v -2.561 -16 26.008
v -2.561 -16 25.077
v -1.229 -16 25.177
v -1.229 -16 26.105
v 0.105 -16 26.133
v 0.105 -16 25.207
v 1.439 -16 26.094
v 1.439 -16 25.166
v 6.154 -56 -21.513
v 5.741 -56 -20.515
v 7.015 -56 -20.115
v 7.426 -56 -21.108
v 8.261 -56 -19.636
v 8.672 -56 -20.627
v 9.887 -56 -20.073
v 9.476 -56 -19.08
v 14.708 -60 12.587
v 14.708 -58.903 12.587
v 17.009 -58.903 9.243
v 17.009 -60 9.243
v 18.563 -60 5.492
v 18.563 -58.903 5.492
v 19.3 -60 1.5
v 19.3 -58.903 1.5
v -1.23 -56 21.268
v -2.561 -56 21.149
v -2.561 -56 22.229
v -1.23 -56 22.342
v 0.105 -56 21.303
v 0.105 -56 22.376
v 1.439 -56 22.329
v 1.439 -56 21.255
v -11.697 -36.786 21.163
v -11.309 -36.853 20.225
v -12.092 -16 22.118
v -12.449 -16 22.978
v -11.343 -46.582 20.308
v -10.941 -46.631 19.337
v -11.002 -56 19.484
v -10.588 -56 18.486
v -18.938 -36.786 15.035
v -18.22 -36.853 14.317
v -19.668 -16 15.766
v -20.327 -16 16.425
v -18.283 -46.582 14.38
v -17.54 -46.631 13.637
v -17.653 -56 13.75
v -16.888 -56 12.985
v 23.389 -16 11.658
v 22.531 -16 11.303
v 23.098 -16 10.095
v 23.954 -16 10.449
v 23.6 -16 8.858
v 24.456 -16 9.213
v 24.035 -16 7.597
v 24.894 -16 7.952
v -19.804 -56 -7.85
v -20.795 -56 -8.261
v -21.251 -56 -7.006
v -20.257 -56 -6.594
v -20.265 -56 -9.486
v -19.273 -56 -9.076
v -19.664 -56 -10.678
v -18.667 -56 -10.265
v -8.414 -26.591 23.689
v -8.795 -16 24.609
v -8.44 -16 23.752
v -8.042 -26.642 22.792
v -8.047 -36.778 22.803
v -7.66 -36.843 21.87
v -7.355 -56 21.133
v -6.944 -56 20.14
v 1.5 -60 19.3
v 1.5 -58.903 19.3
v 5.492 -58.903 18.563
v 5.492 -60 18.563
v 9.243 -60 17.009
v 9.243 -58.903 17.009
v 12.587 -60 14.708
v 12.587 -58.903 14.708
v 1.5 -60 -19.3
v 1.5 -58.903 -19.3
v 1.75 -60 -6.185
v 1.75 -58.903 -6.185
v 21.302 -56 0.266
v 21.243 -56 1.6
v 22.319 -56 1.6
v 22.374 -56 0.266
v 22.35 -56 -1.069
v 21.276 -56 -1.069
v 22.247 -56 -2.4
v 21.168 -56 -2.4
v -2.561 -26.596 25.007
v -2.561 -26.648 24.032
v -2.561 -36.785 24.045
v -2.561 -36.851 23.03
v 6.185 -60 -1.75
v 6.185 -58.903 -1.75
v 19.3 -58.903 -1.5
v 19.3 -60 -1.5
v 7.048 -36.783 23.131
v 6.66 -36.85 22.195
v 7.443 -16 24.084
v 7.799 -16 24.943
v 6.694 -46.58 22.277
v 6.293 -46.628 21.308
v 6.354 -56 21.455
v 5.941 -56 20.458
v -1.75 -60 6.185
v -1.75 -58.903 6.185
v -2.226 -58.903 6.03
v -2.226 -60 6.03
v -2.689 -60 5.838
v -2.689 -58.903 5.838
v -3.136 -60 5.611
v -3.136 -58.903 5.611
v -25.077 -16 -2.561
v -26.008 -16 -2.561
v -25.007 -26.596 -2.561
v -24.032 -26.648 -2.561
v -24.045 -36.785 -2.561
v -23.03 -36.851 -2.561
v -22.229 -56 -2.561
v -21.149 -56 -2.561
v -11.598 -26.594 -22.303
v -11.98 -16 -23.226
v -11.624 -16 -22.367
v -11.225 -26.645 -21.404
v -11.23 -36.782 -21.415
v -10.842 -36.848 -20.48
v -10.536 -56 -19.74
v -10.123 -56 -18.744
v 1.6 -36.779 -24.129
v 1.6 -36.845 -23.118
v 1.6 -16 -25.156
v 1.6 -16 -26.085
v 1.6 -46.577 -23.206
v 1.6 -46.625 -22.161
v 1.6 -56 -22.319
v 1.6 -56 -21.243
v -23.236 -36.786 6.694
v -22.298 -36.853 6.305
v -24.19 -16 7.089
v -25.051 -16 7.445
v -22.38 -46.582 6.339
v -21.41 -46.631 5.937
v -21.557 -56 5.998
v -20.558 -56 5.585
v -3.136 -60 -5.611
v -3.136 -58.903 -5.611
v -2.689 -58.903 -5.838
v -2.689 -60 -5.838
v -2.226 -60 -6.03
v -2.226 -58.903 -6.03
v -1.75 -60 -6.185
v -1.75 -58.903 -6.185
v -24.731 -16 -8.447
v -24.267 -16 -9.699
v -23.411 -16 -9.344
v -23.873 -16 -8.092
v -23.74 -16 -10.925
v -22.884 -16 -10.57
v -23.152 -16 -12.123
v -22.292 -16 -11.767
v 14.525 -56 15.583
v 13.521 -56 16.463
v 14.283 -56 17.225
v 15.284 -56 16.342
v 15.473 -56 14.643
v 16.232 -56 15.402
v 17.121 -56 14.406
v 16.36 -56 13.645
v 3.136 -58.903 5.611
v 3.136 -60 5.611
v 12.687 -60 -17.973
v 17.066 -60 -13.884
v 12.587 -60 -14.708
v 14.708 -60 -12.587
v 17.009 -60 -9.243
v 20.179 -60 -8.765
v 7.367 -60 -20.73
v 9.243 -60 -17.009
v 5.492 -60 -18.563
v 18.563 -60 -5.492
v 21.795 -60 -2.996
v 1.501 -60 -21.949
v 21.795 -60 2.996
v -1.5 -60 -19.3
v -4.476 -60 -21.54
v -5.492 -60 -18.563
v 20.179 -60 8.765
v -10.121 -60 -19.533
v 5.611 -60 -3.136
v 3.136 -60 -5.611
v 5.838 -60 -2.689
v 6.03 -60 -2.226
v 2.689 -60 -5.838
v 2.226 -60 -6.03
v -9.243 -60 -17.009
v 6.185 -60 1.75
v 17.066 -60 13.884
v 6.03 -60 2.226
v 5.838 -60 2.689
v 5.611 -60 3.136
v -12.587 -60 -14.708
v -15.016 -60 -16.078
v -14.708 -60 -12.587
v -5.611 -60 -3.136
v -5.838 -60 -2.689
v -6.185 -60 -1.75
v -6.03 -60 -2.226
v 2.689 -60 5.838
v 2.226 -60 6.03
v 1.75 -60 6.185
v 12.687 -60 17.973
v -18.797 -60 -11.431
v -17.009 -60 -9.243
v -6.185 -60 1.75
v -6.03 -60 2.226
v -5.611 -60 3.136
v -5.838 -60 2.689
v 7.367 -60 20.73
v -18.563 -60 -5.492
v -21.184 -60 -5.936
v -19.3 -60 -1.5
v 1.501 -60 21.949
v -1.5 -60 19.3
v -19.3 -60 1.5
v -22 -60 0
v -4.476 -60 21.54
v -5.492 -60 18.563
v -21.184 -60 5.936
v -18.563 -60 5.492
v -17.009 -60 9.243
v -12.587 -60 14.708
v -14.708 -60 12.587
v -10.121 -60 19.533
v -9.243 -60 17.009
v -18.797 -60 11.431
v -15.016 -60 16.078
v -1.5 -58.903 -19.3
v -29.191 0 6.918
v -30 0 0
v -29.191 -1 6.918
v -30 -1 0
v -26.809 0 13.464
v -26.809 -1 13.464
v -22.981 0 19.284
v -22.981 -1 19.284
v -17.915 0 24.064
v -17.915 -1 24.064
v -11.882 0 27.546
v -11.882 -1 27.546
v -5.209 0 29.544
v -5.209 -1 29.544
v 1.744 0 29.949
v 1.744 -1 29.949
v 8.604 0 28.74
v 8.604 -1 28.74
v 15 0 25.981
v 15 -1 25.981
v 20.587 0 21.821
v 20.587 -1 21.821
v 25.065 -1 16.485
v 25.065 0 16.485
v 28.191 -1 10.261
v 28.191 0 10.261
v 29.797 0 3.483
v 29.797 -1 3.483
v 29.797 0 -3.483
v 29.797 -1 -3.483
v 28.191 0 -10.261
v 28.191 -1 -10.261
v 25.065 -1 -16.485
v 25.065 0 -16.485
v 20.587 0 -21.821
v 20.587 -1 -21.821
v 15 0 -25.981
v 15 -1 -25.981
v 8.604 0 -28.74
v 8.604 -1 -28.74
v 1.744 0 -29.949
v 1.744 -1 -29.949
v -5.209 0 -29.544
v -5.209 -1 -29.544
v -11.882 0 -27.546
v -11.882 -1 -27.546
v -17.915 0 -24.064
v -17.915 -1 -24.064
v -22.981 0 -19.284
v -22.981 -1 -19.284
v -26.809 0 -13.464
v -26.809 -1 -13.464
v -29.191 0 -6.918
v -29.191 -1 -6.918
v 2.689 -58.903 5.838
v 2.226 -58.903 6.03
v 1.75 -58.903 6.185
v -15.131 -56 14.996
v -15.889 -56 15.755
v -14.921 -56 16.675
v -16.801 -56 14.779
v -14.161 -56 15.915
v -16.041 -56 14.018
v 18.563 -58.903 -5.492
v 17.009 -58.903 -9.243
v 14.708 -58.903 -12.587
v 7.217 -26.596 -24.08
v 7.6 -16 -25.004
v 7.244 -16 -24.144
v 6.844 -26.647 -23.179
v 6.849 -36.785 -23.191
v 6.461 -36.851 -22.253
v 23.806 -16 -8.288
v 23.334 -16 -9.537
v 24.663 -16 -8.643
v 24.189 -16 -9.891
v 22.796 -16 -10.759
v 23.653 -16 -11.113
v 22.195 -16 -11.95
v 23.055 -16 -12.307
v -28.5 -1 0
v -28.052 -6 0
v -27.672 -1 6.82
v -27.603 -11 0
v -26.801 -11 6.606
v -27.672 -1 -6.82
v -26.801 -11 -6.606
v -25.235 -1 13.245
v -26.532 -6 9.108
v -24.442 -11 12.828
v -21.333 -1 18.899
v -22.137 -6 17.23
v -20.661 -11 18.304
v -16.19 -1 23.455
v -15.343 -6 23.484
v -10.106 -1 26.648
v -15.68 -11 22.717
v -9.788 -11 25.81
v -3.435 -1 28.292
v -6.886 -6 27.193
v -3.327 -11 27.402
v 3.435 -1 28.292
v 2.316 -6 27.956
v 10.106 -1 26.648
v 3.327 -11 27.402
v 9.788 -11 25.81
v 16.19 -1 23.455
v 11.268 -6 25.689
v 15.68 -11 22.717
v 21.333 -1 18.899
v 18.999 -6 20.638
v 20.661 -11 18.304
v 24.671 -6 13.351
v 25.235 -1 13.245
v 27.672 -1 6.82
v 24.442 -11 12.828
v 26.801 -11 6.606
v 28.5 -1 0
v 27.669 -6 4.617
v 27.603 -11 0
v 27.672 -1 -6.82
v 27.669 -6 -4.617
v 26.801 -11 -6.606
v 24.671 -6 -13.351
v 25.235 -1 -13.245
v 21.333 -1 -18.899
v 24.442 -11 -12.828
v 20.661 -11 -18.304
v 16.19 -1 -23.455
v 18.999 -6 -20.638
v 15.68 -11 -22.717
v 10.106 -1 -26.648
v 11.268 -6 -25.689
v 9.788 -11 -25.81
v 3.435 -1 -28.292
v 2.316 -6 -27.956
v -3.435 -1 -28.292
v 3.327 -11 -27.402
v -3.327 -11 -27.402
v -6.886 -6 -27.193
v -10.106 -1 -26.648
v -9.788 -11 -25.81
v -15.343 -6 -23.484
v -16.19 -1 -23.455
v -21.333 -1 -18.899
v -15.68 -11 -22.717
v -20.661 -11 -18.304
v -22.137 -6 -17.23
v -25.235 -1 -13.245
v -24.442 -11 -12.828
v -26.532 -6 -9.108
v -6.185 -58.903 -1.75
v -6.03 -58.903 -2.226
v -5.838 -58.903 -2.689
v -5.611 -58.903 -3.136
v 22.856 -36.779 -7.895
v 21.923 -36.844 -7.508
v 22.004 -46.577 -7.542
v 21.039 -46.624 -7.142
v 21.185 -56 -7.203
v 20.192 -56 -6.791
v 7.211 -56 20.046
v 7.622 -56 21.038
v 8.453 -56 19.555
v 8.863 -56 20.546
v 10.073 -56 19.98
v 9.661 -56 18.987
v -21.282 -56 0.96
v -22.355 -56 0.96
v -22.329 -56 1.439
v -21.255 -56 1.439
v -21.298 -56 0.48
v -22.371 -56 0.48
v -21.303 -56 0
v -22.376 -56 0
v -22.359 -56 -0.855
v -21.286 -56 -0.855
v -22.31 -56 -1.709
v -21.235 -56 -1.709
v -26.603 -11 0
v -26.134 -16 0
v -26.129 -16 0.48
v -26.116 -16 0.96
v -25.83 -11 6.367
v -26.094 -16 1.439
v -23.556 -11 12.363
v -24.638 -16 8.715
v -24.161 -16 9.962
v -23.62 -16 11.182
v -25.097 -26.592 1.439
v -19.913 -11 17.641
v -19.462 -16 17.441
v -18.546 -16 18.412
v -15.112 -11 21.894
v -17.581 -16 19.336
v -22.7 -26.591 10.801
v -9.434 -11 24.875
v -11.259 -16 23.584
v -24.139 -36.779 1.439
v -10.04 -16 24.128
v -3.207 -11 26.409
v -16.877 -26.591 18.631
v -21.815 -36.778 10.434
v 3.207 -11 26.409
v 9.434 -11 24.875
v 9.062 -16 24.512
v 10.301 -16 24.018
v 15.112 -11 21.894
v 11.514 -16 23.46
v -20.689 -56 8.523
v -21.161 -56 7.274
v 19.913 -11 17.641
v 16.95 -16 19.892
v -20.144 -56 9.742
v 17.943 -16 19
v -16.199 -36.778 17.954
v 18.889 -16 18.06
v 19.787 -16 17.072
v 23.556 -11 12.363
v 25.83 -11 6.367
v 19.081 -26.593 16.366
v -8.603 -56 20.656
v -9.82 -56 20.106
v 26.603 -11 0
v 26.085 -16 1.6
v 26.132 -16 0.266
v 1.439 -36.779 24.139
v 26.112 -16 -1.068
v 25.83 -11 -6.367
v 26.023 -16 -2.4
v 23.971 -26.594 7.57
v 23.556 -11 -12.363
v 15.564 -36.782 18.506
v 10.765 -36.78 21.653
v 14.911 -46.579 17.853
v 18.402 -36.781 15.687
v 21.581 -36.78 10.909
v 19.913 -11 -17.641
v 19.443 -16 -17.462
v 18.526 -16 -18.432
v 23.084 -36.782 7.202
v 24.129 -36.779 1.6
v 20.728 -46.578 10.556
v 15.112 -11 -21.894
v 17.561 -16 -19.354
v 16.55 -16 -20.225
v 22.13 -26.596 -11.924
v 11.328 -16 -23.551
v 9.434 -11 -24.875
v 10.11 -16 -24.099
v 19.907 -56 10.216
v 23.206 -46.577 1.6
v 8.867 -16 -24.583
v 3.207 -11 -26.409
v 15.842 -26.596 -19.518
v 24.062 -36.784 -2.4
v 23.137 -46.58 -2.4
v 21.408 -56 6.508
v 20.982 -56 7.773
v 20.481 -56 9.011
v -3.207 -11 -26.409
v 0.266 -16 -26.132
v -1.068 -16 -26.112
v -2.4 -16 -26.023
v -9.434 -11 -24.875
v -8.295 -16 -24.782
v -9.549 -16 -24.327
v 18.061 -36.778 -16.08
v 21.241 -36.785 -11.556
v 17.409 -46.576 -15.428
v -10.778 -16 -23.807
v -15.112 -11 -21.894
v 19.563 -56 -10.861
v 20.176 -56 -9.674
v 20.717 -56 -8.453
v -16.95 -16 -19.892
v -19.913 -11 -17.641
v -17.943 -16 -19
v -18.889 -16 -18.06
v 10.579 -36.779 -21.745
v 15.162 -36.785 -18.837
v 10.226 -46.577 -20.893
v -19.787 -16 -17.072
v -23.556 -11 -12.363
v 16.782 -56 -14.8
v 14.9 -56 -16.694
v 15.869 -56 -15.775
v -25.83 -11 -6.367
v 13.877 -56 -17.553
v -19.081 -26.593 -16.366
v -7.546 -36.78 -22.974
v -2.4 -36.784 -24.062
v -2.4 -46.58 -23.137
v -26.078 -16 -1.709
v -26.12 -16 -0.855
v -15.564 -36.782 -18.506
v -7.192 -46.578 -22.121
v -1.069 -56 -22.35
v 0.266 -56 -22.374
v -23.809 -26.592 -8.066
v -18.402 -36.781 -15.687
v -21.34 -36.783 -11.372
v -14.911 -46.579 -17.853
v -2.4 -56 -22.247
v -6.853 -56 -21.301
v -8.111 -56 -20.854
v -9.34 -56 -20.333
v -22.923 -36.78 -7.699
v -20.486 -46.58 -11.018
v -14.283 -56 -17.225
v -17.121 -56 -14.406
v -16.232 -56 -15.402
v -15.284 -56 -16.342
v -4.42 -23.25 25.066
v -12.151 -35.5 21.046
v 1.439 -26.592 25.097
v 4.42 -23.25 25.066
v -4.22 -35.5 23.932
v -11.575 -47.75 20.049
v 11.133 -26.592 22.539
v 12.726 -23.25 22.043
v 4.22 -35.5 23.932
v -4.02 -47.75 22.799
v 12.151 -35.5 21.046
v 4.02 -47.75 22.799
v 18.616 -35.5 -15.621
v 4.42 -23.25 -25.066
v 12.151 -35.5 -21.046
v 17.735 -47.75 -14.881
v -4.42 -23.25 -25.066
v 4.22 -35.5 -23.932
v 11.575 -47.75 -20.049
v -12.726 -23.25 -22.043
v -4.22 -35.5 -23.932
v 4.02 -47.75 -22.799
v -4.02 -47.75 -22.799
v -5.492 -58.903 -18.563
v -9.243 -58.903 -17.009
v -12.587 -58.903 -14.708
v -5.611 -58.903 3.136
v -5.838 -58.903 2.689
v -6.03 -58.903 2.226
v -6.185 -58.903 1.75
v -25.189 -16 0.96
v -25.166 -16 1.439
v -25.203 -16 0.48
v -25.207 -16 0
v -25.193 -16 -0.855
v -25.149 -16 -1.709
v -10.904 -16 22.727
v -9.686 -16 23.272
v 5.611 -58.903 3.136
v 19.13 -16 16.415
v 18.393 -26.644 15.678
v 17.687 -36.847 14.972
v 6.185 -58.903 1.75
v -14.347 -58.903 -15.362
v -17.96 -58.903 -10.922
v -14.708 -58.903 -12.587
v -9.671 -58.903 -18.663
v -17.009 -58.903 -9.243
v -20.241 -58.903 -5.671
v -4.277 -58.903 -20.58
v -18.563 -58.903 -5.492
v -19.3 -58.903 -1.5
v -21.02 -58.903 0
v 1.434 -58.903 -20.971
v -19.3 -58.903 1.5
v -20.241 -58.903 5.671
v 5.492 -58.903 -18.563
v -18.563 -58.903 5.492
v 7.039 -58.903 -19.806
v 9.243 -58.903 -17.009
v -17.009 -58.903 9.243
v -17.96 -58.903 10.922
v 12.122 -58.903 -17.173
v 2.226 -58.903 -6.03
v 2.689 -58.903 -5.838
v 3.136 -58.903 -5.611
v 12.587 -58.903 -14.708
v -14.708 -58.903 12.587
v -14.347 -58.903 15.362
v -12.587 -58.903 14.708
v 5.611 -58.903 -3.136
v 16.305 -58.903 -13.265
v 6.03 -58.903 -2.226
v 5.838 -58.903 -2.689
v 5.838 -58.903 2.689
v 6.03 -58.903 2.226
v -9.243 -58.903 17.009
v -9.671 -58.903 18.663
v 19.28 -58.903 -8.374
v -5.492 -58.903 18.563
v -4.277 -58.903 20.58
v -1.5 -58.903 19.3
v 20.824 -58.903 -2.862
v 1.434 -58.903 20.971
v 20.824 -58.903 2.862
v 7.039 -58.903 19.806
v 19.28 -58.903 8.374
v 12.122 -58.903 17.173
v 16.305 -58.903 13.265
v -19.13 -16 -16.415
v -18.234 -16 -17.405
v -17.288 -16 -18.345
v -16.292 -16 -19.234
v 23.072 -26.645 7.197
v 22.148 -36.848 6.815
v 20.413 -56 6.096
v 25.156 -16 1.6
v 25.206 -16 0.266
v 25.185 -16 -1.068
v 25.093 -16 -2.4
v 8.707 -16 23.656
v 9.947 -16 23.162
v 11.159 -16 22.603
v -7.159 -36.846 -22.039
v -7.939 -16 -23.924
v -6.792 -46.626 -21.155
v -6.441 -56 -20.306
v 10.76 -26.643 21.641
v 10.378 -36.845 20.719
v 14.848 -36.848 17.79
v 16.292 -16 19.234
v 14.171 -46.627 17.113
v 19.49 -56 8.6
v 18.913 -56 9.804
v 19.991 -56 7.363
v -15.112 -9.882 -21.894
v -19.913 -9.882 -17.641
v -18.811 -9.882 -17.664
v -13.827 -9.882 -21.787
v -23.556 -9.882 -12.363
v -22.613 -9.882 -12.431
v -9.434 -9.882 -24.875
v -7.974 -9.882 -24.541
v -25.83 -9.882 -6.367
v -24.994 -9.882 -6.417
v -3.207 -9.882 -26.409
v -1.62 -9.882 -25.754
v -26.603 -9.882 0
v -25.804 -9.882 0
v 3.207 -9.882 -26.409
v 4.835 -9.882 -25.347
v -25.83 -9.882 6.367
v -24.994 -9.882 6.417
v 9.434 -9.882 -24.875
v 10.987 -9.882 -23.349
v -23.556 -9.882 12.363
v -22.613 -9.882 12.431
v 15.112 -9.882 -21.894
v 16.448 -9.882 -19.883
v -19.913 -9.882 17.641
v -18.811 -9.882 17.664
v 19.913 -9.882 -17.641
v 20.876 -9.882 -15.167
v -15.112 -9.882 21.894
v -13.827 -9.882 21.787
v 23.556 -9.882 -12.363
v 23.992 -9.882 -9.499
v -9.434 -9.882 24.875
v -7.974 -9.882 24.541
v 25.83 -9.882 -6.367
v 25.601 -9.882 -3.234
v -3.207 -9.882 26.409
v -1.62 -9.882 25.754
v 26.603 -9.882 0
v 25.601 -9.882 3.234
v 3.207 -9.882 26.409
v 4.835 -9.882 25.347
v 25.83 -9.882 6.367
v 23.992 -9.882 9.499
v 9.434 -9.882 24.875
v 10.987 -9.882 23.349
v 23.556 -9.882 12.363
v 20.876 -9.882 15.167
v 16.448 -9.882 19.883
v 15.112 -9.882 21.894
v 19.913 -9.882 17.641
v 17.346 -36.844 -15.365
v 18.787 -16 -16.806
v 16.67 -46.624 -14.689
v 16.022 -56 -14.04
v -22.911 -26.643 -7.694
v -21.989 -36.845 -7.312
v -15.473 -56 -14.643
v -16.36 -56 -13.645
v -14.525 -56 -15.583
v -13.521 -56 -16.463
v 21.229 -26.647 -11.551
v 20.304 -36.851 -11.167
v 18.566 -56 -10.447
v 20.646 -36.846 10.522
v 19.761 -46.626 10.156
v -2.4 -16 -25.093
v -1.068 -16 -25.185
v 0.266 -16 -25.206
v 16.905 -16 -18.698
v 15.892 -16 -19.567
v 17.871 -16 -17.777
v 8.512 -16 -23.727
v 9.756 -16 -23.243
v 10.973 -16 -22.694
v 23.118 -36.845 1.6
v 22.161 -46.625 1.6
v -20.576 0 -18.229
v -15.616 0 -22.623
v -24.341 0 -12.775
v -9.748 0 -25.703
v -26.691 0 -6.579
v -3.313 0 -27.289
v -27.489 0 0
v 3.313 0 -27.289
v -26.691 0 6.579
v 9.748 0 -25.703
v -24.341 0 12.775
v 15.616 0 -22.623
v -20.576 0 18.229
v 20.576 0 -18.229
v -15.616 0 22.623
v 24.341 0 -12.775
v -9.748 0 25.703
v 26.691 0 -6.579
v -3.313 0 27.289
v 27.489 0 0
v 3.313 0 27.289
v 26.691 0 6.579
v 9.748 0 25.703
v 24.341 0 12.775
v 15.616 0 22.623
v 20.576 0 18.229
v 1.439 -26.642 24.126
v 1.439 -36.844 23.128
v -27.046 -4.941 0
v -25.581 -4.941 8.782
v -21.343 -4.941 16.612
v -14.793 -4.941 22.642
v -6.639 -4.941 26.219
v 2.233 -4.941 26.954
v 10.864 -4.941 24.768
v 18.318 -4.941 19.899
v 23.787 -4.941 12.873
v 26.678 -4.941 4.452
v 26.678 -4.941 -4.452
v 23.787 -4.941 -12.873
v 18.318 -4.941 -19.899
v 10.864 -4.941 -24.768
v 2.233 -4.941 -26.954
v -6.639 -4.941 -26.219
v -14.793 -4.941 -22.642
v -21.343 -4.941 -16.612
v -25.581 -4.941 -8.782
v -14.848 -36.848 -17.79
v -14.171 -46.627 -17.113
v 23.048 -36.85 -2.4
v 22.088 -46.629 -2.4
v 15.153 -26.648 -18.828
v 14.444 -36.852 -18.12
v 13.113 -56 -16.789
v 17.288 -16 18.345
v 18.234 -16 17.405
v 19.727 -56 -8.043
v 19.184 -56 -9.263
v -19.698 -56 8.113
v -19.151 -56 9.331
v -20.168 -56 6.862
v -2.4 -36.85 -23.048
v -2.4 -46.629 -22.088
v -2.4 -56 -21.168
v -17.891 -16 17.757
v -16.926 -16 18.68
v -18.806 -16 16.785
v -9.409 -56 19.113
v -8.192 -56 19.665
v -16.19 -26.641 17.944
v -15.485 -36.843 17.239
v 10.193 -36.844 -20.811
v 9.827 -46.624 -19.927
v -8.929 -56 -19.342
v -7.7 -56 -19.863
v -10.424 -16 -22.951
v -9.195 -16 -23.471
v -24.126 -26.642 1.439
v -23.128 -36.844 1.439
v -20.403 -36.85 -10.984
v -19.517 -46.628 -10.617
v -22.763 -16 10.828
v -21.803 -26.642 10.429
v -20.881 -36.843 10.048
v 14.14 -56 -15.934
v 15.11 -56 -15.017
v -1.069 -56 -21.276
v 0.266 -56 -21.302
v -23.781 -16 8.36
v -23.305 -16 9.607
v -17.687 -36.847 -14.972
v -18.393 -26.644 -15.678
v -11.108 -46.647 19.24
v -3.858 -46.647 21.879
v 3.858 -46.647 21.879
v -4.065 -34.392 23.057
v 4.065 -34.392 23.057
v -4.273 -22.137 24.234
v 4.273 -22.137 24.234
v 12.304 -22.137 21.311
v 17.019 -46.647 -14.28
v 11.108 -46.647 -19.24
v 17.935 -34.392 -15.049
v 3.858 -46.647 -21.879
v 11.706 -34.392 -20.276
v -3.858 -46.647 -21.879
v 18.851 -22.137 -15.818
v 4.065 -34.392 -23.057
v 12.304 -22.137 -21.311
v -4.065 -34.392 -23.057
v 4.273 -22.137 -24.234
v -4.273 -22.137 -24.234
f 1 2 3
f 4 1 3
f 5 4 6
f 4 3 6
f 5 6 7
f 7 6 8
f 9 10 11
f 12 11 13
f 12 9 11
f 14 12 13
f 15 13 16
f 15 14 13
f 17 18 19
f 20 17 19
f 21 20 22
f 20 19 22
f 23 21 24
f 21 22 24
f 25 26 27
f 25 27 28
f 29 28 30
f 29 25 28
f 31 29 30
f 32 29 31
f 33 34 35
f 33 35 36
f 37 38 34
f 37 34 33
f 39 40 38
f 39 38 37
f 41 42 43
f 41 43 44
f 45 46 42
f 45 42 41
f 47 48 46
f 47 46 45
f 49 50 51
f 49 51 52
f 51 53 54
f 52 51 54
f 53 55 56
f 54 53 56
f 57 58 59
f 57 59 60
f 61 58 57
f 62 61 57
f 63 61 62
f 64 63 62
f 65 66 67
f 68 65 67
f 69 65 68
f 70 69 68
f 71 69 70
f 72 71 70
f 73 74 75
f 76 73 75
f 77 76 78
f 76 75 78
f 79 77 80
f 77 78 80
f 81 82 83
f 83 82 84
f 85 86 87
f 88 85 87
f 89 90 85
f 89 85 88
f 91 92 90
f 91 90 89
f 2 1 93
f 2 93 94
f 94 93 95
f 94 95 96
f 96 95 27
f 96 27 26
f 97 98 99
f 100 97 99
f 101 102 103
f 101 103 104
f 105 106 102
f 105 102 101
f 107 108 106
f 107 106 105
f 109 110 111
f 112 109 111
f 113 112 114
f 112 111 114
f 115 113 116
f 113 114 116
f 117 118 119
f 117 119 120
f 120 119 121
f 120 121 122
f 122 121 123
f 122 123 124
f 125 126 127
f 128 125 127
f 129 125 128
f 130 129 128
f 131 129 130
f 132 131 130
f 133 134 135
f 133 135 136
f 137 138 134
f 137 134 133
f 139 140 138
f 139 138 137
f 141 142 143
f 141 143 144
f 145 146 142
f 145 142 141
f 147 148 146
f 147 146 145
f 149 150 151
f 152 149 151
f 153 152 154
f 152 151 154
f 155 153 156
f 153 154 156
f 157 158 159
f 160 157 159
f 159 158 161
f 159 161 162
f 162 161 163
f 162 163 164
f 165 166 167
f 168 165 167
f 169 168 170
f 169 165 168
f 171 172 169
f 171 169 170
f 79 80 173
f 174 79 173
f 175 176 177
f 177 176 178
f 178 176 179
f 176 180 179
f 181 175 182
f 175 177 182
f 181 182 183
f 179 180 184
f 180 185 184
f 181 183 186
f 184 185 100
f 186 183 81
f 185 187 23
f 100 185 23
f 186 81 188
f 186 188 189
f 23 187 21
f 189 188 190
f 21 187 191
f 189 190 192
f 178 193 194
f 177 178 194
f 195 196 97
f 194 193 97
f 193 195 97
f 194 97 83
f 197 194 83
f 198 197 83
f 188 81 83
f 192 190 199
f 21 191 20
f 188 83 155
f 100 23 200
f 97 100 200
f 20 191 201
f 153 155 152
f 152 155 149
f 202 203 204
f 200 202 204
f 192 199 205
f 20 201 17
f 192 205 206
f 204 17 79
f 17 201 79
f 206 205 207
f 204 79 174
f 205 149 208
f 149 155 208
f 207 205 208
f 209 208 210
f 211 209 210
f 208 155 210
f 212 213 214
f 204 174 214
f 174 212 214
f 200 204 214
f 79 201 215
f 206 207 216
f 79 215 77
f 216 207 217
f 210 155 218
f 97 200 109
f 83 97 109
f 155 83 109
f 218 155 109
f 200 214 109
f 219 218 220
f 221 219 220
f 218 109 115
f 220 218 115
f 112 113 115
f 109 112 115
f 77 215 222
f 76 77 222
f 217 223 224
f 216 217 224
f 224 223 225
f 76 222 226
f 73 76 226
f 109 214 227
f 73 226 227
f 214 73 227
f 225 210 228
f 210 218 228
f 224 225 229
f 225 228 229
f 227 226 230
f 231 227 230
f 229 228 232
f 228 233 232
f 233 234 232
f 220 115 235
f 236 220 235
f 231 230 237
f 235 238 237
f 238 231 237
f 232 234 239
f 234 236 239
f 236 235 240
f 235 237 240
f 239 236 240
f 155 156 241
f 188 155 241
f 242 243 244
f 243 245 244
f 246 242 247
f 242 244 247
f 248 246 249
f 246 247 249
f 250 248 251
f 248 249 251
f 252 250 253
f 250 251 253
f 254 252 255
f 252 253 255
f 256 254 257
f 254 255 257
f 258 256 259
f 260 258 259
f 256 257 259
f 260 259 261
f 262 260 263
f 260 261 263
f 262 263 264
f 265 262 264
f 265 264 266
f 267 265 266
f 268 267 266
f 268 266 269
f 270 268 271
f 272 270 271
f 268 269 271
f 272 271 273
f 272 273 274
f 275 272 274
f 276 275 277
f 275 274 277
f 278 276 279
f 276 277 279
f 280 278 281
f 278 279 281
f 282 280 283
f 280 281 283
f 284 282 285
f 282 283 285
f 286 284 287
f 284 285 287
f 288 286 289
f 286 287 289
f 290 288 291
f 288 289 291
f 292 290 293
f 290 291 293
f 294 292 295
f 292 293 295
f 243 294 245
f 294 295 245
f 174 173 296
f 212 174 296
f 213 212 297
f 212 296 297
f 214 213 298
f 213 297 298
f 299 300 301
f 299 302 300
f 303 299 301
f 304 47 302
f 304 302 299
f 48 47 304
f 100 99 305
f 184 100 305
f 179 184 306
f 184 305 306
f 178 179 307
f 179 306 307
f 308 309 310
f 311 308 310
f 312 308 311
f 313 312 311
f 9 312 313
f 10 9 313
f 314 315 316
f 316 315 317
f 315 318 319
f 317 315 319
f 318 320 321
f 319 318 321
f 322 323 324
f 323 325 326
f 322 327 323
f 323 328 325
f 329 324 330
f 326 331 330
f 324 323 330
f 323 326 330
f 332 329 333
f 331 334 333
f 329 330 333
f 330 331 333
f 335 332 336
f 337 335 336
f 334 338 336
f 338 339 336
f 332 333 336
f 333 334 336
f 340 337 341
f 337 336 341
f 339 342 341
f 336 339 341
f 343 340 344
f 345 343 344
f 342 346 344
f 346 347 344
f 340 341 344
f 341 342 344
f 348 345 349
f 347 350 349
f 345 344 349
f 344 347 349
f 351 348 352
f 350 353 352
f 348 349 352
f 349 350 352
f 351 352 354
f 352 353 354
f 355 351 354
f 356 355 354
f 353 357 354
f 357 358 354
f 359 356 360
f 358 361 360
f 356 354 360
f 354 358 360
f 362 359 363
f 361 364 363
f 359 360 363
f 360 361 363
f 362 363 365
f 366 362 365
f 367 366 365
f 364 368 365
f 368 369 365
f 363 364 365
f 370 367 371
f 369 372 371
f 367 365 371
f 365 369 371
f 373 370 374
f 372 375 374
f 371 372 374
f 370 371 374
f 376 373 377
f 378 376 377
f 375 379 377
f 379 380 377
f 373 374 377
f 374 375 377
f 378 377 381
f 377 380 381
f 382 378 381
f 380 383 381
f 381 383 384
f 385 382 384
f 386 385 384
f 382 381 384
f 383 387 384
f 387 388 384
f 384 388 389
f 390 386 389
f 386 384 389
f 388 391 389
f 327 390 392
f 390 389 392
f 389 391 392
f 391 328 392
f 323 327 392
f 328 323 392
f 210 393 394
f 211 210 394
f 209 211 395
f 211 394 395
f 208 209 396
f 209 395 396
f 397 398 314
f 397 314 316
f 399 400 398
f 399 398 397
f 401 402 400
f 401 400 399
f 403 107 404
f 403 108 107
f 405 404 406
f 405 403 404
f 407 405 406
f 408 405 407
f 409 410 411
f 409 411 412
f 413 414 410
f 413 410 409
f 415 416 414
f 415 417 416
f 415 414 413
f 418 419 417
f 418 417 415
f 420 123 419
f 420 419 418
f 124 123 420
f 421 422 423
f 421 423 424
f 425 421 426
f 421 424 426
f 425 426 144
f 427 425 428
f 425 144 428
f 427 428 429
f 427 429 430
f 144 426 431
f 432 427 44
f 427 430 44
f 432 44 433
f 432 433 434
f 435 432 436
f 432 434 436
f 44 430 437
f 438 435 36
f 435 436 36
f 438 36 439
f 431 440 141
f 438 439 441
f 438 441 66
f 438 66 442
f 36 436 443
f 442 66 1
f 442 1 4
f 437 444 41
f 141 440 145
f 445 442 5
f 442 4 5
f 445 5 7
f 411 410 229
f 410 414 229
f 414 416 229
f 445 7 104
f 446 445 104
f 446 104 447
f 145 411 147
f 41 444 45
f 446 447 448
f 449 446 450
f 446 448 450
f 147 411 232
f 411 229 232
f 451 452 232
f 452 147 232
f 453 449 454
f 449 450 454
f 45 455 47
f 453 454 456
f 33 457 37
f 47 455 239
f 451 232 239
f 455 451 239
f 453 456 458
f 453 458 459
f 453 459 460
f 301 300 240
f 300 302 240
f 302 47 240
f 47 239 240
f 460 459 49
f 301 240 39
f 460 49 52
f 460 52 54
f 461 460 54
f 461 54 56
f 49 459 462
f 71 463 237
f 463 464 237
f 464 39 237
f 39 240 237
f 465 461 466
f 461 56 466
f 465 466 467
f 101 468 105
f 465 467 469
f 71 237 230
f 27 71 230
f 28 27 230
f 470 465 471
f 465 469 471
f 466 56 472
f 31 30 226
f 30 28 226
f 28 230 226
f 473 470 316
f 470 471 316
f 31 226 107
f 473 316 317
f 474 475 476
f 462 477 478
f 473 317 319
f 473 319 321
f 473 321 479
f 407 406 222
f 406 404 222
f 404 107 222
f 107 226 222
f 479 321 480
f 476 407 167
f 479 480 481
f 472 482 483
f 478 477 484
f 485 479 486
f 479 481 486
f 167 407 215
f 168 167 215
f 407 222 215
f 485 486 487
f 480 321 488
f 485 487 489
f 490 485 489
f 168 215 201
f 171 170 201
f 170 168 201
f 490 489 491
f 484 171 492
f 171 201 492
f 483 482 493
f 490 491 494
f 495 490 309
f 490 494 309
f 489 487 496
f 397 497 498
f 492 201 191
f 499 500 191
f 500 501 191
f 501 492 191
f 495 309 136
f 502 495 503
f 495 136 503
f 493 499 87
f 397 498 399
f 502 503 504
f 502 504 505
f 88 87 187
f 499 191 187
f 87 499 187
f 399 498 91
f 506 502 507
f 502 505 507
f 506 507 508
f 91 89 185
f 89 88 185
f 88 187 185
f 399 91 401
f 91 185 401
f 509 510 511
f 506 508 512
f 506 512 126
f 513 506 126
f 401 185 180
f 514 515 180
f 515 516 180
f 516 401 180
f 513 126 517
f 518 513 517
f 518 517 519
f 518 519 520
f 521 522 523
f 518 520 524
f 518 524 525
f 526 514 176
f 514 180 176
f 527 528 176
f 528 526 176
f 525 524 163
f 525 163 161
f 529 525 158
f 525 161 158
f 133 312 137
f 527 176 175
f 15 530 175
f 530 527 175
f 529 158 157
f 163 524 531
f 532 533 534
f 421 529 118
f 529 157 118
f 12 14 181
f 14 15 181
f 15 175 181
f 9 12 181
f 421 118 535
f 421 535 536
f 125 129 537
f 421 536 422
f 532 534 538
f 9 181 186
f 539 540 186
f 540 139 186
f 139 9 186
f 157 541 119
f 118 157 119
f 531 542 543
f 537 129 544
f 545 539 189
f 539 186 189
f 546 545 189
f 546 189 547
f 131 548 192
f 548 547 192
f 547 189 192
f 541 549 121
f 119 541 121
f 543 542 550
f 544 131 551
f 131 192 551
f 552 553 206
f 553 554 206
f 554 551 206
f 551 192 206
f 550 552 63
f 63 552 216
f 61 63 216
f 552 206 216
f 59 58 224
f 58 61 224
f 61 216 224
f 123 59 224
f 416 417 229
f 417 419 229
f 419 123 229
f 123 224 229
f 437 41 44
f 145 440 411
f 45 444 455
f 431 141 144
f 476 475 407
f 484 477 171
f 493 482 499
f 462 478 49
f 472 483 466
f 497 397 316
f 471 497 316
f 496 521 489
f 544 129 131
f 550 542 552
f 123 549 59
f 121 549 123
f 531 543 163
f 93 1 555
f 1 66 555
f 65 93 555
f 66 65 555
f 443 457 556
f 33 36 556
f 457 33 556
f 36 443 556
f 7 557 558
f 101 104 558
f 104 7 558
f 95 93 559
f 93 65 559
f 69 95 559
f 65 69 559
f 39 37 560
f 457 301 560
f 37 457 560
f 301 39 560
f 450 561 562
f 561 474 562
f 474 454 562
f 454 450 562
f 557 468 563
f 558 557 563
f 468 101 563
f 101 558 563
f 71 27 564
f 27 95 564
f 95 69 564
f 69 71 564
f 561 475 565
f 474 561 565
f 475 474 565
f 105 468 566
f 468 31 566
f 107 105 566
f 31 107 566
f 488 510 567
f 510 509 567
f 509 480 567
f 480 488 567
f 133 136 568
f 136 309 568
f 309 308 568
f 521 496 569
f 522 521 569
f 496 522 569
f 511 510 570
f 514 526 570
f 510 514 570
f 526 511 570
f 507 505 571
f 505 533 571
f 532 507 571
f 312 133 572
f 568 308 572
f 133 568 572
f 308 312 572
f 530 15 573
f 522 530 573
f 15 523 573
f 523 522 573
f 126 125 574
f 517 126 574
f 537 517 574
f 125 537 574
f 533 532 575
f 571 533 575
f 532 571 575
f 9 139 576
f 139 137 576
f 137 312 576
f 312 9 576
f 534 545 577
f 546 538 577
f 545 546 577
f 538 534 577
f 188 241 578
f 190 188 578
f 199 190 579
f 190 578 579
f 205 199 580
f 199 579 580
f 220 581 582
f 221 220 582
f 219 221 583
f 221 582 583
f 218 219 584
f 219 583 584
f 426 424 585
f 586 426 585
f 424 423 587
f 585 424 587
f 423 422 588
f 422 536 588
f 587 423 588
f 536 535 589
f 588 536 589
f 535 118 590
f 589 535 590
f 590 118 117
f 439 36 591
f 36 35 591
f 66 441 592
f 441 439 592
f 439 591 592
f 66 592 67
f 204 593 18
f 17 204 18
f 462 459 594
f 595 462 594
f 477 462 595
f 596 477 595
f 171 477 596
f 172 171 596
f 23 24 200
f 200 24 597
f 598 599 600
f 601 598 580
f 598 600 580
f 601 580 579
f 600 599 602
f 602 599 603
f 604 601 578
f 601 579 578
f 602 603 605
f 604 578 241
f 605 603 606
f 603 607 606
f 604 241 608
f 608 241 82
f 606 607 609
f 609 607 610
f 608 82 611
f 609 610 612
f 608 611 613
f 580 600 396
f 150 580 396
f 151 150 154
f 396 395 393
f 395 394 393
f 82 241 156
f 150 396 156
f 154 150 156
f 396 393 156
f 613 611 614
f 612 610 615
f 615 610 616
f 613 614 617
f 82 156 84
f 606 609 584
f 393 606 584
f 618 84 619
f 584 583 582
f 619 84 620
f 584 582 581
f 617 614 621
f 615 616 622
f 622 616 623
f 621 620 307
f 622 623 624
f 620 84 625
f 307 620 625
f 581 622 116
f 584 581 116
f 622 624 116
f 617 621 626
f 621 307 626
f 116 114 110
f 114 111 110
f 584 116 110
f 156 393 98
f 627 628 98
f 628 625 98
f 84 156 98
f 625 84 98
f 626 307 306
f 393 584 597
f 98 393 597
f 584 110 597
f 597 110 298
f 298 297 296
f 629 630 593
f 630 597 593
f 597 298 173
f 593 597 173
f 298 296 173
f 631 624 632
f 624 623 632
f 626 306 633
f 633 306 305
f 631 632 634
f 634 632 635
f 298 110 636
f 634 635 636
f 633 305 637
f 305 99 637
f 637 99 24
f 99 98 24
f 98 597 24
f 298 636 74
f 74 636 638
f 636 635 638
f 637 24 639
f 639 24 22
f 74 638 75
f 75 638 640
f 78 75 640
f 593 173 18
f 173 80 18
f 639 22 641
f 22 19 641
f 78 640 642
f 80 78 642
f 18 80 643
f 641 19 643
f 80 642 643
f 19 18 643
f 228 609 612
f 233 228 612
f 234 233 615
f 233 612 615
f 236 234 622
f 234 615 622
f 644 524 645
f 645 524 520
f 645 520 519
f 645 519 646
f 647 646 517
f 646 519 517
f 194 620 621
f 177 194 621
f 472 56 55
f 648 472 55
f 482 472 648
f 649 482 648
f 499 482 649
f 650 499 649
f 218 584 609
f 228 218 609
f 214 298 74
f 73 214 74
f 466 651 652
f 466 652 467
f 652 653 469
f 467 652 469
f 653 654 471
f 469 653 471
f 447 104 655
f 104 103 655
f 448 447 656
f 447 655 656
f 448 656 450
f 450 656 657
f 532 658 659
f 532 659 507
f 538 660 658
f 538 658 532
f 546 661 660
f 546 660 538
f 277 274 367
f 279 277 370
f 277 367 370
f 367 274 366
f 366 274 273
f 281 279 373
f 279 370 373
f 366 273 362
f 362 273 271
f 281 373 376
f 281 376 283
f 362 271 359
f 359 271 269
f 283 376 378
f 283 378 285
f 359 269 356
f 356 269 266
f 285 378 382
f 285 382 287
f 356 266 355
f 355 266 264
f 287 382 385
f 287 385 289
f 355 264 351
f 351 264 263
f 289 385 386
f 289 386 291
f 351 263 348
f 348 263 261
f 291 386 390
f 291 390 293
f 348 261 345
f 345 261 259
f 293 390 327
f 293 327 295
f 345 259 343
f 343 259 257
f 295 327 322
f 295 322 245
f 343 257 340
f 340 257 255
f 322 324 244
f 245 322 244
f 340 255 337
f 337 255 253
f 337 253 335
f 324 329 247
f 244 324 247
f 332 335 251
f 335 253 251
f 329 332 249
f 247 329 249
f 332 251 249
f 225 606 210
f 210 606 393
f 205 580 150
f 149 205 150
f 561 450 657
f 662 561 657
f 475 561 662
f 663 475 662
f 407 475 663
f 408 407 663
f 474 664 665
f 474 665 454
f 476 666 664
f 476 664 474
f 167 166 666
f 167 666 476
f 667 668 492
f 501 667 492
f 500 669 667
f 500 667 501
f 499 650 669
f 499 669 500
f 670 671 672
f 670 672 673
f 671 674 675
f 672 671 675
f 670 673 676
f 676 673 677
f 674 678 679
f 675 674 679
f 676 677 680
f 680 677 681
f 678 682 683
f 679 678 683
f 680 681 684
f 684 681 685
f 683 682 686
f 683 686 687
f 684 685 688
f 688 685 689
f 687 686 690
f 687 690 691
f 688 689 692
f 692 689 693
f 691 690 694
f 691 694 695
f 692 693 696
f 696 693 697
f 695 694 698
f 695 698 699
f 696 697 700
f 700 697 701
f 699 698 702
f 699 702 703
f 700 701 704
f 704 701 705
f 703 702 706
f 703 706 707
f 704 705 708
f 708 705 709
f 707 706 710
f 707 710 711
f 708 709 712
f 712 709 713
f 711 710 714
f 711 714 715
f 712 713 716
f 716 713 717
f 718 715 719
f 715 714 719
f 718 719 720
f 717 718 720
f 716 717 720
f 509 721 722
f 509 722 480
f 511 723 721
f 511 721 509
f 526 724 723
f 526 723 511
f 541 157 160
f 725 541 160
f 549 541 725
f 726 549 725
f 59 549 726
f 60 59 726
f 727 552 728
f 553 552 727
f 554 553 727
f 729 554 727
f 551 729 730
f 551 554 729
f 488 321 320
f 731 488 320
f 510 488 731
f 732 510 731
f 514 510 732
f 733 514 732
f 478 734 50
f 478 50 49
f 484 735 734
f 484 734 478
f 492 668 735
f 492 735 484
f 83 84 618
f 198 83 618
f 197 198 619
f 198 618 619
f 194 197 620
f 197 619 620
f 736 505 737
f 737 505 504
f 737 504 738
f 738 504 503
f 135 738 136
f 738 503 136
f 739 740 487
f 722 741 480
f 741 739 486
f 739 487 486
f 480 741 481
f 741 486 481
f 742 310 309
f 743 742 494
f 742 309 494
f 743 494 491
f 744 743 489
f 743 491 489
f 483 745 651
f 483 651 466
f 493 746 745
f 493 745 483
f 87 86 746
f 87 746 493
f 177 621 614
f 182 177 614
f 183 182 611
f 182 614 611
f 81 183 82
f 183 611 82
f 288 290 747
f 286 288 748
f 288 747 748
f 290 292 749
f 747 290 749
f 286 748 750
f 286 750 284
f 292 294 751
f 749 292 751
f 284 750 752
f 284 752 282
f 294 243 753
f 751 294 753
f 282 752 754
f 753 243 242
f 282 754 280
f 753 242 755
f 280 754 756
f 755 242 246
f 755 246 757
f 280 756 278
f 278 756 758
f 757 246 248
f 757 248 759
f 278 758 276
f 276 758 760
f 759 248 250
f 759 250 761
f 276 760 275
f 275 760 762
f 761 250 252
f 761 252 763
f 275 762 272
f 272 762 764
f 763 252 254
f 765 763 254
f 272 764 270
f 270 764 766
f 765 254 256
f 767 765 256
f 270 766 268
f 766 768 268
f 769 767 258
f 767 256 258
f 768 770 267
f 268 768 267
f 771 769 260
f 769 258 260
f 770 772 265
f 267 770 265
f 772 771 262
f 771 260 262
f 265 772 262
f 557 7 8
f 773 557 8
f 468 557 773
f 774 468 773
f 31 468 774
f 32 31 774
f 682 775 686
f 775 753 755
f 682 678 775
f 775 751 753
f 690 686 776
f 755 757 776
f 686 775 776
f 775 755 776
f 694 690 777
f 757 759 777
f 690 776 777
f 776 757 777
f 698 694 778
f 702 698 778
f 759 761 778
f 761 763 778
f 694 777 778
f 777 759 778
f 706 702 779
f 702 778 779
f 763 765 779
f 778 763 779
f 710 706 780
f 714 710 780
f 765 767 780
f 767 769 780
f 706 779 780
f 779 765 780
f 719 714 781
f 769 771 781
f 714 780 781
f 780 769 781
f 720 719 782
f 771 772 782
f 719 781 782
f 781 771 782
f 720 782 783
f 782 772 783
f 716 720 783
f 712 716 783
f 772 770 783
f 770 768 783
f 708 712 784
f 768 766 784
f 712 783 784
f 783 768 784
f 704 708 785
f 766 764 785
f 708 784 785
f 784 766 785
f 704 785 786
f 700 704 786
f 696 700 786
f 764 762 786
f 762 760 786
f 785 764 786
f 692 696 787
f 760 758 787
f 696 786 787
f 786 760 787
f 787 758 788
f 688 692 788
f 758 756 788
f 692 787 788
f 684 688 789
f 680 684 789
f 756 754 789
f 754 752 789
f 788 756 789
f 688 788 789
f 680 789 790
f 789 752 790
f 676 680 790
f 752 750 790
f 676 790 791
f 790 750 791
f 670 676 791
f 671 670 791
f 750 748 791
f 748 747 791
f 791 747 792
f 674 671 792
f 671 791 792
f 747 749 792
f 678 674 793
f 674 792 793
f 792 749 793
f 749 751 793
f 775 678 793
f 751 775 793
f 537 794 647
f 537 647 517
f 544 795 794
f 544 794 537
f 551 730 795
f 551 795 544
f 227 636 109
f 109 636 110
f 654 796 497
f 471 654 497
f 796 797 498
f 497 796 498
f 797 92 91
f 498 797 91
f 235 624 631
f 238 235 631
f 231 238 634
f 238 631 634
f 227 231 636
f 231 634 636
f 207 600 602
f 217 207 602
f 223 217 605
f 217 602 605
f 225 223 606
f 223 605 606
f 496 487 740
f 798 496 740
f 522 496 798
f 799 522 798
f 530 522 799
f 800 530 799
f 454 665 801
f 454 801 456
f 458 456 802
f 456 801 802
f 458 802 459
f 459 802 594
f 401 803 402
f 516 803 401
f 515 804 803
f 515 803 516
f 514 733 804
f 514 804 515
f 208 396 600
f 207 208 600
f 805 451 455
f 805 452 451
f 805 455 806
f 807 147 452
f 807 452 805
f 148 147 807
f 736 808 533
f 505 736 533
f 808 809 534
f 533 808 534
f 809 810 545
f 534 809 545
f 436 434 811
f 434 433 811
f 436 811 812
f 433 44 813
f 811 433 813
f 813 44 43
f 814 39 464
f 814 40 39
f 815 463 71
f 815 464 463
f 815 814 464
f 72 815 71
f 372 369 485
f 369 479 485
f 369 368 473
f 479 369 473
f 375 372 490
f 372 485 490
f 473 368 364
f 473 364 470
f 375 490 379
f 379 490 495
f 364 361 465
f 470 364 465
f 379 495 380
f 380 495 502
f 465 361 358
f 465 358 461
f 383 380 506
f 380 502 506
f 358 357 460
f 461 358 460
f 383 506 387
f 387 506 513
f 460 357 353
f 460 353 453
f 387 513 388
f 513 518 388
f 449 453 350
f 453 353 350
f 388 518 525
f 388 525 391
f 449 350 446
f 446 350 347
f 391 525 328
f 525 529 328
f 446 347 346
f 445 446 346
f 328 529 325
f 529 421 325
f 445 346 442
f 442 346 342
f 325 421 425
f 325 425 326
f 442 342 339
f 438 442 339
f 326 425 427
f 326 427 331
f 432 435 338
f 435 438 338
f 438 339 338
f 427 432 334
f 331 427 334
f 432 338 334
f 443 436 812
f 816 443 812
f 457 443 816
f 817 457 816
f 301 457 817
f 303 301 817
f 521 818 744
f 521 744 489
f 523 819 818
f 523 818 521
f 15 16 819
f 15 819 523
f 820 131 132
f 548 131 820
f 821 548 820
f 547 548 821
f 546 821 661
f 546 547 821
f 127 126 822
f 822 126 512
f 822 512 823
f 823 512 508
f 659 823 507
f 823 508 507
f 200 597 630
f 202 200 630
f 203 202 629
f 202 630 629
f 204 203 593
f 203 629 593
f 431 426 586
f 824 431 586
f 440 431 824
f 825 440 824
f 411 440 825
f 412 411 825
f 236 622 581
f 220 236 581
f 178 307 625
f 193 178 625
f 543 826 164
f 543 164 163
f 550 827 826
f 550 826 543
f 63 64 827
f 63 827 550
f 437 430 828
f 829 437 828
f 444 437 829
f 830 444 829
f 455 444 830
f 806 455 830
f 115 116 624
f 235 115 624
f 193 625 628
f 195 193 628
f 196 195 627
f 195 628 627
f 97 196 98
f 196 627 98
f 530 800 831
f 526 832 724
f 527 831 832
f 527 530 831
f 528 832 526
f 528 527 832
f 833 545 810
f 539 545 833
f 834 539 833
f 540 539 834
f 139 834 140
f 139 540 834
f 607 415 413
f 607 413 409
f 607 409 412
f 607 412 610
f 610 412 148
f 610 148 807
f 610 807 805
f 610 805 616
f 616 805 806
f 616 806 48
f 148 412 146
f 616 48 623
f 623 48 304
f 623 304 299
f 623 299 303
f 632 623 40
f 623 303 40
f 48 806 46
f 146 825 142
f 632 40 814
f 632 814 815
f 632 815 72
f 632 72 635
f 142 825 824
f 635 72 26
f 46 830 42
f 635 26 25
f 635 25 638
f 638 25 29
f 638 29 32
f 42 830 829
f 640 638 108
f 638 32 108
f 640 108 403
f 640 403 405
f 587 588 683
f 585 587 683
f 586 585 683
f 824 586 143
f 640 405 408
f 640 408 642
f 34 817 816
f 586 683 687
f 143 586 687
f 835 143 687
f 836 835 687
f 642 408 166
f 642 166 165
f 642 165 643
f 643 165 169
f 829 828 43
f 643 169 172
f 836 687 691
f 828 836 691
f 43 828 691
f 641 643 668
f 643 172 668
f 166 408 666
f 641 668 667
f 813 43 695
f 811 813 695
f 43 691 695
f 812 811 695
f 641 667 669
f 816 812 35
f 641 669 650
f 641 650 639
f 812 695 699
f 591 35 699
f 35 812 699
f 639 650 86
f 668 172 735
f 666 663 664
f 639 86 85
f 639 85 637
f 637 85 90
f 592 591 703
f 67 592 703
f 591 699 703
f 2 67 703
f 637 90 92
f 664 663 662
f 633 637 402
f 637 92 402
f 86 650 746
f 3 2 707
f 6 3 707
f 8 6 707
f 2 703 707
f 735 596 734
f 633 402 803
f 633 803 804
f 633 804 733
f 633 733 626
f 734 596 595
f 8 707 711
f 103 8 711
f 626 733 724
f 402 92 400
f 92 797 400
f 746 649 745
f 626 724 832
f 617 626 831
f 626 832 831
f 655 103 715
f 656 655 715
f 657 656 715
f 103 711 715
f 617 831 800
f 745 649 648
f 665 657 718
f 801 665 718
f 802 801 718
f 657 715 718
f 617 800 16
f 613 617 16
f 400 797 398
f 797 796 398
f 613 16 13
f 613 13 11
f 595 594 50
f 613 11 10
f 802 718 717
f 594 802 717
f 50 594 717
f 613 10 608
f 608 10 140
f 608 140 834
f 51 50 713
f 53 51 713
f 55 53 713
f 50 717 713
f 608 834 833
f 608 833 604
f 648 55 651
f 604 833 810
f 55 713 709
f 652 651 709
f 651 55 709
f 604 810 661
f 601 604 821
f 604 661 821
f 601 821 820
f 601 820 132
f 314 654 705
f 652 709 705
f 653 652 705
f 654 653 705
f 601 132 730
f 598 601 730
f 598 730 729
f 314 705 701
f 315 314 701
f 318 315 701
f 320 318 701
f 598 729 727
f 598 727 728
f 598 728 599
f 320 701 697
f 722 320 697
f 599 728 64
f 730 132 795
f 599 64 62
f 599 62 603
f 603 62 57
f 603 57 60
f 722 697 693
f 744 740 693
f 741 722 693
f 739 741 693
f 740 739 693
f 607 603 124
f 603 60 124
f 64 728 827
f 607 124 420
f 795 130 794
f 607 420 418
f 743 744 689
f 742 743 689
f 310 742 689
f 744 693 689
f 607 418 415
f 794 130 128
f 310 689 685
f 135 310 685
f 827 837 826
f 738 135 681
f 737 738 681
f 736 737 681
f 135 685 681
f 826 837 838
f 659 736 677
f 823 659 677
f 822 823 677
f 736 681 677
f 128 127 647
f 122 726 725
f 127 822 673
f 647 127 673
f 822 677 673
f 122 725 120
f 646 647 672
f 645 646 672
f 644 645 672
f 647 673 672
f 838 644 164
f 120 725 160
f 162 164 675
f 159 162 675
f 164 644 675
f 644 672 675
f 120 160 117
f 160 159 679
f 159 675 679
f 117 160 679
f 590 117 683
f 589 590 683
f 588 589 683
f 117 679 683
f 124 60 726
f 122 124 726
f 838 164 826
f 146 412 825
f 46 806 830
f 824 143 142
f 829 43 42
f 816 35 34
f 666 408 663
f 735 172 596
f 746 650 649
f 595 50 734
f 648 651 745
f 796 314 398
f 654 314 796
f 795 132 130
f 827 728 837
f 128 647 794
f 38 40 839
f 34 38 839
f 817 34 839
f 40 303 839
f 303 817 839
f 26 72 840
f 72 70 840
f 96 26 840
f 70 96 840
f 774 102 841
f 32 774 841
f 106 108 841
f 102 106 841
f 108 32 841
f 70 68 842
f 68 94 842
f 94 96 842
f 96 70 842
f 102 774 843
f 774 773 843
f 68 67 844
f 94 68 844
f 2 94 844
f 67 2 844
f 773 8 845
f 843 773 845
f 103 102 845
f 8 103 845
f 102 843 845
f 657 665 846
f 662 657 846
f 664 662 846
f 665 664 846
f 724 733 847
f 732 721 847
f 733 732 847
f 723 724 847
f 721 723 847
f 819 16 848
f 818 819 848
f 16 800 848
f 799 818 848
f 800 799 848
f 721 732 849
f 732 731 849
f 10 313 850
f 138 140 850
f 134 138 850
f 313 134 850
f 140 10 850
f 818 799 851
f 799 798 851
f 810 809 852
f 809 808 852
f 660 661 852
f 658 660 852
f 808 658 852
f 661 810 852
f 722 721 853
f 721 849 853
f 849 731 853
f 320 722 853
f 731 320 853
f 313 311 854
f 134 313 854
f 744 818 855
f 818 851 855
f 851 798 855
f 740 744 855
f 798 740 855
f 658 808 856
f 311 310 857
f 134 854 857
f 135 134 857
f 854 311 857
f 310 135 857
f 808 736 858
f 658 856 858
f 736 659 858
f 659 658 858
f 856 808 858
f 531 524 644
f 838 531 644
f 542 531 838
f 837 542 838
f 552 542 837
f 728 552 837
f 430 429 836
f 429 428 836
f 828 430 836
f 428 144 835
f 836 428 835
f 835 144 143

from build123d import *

# Parameters (mm, degrees)
CORTAR_EXTRUIR2_DEPTH = 112
CROQUIS11_W           = 4
CROQUIS11_H           = 16.808089165
CROQUIS11_W_2         = 16.808089165
CROQUIS11_H_2         = 4
CORTAR_EXTRUIR3_DEPTH = 40


with BuildPart() as part:
    # Croquis1 → Revolución1 (revolve)
    with BuildSketch(Plane.XY):
        Polygon((-27.489415048, 0), (-30, 0), (-30, -1), (-28.5, -1), (-27.603353842, -11), (-26.603353842, -11), (-22, -60), (0, -60), (0, -58.902540381), (-21.020029368, -58.902540381), (-25.804439037, -9.881949504), (-26.603353842, -9.881949504), align=None)
    revolve(axis=Axis((0, -60, 0), (0, 1, 0)))

    # Croquis9 → Cortar-Extruir2 (cut)
    with BuildSketch(Plane(origin=(0, 0, 0), x_dir=(1, 0, 0), z_dir=(0, 1, 0))):
        with BuildLine():
            Line((-1.75, 6.184718181), (-1.5, 19.300075922))
            ThreePointArc((-1.5, 19.300075922), (-7.408092304, 17.884716912), (-12.58655439, 14.707874734))
            Line((-12.58655439, 14.707874734), (-3.135819299, 5.610693033))
            ThreePointArc((-3.135819299, 5.610693033), (-2.459712132, 5.938270389), (-1.75, 6.184718181))
        make_face()
        with BuildLine():
            Line((3.135819299, 5.610693033), (12.58655439, 14.707874734))
            ThreePointArc((12.58655439, 14.707874734), (7.408092304, 17.884716912), (1.5, 19.300075922))
            Line((1.5, 19.300075922), (1.75, 6.184718181))
            ThreePointArc((1.75, 6.184718181), (2.459712132, 5.938270389), (3.135819299, 5.610693033))
        make_face()
        with BuildLine():
            Line((6.184718181, 1.75), (19.300075922, 1.5))
            ThreePointArc((19.300075922, 1.5), (17.884716912, 7.408092304), (14.707874734, 12.58655439))
            Line((14.707874734, 12.58655439), (5.610693033, 3.135819299))
            ThreePointArc((5.610693033, 3.135819299), (5.938270389, 2.459712132), (6.184718181, 1.75))
        make_face()
        with BuildLine():
            Line((5.610693033, -3.135819299), (14.707874734, -12.58655439))
            ThreePointArc((14.707874734, -12.58655439), (17.884716912, -7.408092304), (19.300075922, -1.5))
            Line((19.300075922, -1.5), (6.184718181, -1.75))
            ThreePointArc((6.184718181, -1.75), (5.938270389, -2.459712132), (5.610693033, -3.135819299))
        make_face()
        with BuildLine():
            Line((1.75, -6.184718181), (1.5, -19.300075922))
            ThreePointArc((1.5, -19.300075922), (7.408092304, -17.884716912), (12.58655439, -14.707874734))
            Line((12.58655439, -14.707874734), (3.135819299, -5.610693033))
            ThreePointArc((3.135819299, -5.610693033), (2.459712132, -5.938270389), (1.75, -6.184718181))
        make_face()
        with BuildLine():
            Line((-3.135819299, -5.610693033), (-12.58655439, -14.707874734))
            ThreePointArc((-12.58655439, -14.707874734), (-7.408092304, -17.884716912), (-1.5, -19.300075922))
            Line((-1.5, -19.300075922), (-1.75, -6.184718181))
            ThreePointArc((-1.75, -6.184718181), (-2.459712132, -5.938270389), (-3.135819299, -5.610693033))
        make_face()
        with BuildLine():
            Line((-6.184718181, -1.75), (-19.300075922, -1.5))
            ThreePointArc((-19.300075922, -1.5), (-17.884716912, -7.408092304), (-14.707874734, -12.58655439))
            Line((-14.707874734, -12.58655439), (-5.610693033, -3.135819299))
            ThreePointArc((-5.610693033, -3.135819299), (-5.938270389, -2.459712132), (-6.184718181, -1.75))
        make_face()
        with BuildLine():
            Line((-5.610693033, 3.135819299), (-14.707874734, 12.58655439))
            ThreePointArc((-14.707874734, 12.58655439), (-17.884716912, 7.408092304), (-19.300075922, 1.5))
            Line((-19.300075922, 1.5), (-6.184718181, 1.75))
            ThreePointArc((-6.184718181, 1.75), (-5.938270389, 2.459712132), (-5.610693033, 3.135819299))
        make_face()
    extrude(amount=-CORTAR_EXTRUIR2_DEPTH, mode=Mode.SUBTRACT)

    # Croquis11 → Cortar-Extruir3 (cut)
    with BuildSketch(Plane(origin=(0, -56, 0), x_dir=(1, 0, 0), z_dir=(0, 1, 0))):
        with Locations((-0.4, 22.457977408)):
            Rectangle(CROQUIS11_W, CROQUIS11_H)
        Polygon((9.372703114, 29.283983817), (2.940525861, 13.755334257), (6.636043991, 12.224600528), (13.068221244, 27.753250088), align=None)
        Polygon((19.645373498, 23.320848212), (7.760259671, 11.435734384), (10.588686796, 8.60730726), (22.473800623, 20.492421087), align=None)
        Polygon((26.854090209, 13.880448514), (11.325440649, 7.448271261), (12.856174379, 3.75275313), (28.384823939, 10.184930384), align=None)
        with Locations((21.497346893, 0.4)):
            Rectangle(CROQUIS11_W_2, CROQUIS11_H_2)
        Polygon((28.323353302, -9.372703114), (12.794703741, -2.940525861), (11.263970012, -6.636043991), (26.792619572, -13.068221244), align=None)
        Polygon((22.360217696, -19.645373498), (10.475103869, -7.760259671), (7.646676744, -10.588686796), (19.531790571, -22.473800623), align=None)
        Polygon((12.919817998, -26.854090209), (6.487640745, -11.325440649), (2.792122615, -12.856174379), (9.224299868, -28.384823939), align=None)
        with Locations((-0.560630516, -21.497346893)):
            Rectangle(CROQUIS11_W, CROQUIS11_H)
        Polygon((-10.333333629, -28.323353302), (-3.901156376, -12.794703741), (-7.596674506, -11.263970012), (-14.028851759, -26.792619572), align=None)
        Polygon((-20.606004014, -22.360217696), (-8.720890187, -10.475103869), (-11.549317311, -7.646676744), (-23.434431139, -19.531790571), align=None)
        Polygon((-27.814720725, -12.919817998), (-12.286071165, -6.487640745), (-13.816804894, -2.792122615), (-29.345454454, -9.224299868), align=None)
        with Locations((-22.457977408, 0.560630516)):
            Rectangle(CROQUIS11_W_2, CROQUIS11_H_2)
        Polygon((-29.283983817, 10.333333629), (-13.755334257, 3.901156376), (-12.224600528, 7.596674506), (-27.753250088, 14.028851759), align=None)
        Polygon((-23.320848212, 20.606004014), (-11.435734384, 8.720890187), (-8.60730726, 11.549317311), (-20.492421087, 23.434431139), align=None)
        Polygon((-13.880448514, 27.814720725), (-7.448271261, 12.286071165), (-3.75275313, 13.816804894), (-10.184930384, 29.345454454), align=None)
    extrude(amount=CORTAR_EXTRUIR3_DEPTH, mode=Mode.SUBTRACT)


solid = part.part
